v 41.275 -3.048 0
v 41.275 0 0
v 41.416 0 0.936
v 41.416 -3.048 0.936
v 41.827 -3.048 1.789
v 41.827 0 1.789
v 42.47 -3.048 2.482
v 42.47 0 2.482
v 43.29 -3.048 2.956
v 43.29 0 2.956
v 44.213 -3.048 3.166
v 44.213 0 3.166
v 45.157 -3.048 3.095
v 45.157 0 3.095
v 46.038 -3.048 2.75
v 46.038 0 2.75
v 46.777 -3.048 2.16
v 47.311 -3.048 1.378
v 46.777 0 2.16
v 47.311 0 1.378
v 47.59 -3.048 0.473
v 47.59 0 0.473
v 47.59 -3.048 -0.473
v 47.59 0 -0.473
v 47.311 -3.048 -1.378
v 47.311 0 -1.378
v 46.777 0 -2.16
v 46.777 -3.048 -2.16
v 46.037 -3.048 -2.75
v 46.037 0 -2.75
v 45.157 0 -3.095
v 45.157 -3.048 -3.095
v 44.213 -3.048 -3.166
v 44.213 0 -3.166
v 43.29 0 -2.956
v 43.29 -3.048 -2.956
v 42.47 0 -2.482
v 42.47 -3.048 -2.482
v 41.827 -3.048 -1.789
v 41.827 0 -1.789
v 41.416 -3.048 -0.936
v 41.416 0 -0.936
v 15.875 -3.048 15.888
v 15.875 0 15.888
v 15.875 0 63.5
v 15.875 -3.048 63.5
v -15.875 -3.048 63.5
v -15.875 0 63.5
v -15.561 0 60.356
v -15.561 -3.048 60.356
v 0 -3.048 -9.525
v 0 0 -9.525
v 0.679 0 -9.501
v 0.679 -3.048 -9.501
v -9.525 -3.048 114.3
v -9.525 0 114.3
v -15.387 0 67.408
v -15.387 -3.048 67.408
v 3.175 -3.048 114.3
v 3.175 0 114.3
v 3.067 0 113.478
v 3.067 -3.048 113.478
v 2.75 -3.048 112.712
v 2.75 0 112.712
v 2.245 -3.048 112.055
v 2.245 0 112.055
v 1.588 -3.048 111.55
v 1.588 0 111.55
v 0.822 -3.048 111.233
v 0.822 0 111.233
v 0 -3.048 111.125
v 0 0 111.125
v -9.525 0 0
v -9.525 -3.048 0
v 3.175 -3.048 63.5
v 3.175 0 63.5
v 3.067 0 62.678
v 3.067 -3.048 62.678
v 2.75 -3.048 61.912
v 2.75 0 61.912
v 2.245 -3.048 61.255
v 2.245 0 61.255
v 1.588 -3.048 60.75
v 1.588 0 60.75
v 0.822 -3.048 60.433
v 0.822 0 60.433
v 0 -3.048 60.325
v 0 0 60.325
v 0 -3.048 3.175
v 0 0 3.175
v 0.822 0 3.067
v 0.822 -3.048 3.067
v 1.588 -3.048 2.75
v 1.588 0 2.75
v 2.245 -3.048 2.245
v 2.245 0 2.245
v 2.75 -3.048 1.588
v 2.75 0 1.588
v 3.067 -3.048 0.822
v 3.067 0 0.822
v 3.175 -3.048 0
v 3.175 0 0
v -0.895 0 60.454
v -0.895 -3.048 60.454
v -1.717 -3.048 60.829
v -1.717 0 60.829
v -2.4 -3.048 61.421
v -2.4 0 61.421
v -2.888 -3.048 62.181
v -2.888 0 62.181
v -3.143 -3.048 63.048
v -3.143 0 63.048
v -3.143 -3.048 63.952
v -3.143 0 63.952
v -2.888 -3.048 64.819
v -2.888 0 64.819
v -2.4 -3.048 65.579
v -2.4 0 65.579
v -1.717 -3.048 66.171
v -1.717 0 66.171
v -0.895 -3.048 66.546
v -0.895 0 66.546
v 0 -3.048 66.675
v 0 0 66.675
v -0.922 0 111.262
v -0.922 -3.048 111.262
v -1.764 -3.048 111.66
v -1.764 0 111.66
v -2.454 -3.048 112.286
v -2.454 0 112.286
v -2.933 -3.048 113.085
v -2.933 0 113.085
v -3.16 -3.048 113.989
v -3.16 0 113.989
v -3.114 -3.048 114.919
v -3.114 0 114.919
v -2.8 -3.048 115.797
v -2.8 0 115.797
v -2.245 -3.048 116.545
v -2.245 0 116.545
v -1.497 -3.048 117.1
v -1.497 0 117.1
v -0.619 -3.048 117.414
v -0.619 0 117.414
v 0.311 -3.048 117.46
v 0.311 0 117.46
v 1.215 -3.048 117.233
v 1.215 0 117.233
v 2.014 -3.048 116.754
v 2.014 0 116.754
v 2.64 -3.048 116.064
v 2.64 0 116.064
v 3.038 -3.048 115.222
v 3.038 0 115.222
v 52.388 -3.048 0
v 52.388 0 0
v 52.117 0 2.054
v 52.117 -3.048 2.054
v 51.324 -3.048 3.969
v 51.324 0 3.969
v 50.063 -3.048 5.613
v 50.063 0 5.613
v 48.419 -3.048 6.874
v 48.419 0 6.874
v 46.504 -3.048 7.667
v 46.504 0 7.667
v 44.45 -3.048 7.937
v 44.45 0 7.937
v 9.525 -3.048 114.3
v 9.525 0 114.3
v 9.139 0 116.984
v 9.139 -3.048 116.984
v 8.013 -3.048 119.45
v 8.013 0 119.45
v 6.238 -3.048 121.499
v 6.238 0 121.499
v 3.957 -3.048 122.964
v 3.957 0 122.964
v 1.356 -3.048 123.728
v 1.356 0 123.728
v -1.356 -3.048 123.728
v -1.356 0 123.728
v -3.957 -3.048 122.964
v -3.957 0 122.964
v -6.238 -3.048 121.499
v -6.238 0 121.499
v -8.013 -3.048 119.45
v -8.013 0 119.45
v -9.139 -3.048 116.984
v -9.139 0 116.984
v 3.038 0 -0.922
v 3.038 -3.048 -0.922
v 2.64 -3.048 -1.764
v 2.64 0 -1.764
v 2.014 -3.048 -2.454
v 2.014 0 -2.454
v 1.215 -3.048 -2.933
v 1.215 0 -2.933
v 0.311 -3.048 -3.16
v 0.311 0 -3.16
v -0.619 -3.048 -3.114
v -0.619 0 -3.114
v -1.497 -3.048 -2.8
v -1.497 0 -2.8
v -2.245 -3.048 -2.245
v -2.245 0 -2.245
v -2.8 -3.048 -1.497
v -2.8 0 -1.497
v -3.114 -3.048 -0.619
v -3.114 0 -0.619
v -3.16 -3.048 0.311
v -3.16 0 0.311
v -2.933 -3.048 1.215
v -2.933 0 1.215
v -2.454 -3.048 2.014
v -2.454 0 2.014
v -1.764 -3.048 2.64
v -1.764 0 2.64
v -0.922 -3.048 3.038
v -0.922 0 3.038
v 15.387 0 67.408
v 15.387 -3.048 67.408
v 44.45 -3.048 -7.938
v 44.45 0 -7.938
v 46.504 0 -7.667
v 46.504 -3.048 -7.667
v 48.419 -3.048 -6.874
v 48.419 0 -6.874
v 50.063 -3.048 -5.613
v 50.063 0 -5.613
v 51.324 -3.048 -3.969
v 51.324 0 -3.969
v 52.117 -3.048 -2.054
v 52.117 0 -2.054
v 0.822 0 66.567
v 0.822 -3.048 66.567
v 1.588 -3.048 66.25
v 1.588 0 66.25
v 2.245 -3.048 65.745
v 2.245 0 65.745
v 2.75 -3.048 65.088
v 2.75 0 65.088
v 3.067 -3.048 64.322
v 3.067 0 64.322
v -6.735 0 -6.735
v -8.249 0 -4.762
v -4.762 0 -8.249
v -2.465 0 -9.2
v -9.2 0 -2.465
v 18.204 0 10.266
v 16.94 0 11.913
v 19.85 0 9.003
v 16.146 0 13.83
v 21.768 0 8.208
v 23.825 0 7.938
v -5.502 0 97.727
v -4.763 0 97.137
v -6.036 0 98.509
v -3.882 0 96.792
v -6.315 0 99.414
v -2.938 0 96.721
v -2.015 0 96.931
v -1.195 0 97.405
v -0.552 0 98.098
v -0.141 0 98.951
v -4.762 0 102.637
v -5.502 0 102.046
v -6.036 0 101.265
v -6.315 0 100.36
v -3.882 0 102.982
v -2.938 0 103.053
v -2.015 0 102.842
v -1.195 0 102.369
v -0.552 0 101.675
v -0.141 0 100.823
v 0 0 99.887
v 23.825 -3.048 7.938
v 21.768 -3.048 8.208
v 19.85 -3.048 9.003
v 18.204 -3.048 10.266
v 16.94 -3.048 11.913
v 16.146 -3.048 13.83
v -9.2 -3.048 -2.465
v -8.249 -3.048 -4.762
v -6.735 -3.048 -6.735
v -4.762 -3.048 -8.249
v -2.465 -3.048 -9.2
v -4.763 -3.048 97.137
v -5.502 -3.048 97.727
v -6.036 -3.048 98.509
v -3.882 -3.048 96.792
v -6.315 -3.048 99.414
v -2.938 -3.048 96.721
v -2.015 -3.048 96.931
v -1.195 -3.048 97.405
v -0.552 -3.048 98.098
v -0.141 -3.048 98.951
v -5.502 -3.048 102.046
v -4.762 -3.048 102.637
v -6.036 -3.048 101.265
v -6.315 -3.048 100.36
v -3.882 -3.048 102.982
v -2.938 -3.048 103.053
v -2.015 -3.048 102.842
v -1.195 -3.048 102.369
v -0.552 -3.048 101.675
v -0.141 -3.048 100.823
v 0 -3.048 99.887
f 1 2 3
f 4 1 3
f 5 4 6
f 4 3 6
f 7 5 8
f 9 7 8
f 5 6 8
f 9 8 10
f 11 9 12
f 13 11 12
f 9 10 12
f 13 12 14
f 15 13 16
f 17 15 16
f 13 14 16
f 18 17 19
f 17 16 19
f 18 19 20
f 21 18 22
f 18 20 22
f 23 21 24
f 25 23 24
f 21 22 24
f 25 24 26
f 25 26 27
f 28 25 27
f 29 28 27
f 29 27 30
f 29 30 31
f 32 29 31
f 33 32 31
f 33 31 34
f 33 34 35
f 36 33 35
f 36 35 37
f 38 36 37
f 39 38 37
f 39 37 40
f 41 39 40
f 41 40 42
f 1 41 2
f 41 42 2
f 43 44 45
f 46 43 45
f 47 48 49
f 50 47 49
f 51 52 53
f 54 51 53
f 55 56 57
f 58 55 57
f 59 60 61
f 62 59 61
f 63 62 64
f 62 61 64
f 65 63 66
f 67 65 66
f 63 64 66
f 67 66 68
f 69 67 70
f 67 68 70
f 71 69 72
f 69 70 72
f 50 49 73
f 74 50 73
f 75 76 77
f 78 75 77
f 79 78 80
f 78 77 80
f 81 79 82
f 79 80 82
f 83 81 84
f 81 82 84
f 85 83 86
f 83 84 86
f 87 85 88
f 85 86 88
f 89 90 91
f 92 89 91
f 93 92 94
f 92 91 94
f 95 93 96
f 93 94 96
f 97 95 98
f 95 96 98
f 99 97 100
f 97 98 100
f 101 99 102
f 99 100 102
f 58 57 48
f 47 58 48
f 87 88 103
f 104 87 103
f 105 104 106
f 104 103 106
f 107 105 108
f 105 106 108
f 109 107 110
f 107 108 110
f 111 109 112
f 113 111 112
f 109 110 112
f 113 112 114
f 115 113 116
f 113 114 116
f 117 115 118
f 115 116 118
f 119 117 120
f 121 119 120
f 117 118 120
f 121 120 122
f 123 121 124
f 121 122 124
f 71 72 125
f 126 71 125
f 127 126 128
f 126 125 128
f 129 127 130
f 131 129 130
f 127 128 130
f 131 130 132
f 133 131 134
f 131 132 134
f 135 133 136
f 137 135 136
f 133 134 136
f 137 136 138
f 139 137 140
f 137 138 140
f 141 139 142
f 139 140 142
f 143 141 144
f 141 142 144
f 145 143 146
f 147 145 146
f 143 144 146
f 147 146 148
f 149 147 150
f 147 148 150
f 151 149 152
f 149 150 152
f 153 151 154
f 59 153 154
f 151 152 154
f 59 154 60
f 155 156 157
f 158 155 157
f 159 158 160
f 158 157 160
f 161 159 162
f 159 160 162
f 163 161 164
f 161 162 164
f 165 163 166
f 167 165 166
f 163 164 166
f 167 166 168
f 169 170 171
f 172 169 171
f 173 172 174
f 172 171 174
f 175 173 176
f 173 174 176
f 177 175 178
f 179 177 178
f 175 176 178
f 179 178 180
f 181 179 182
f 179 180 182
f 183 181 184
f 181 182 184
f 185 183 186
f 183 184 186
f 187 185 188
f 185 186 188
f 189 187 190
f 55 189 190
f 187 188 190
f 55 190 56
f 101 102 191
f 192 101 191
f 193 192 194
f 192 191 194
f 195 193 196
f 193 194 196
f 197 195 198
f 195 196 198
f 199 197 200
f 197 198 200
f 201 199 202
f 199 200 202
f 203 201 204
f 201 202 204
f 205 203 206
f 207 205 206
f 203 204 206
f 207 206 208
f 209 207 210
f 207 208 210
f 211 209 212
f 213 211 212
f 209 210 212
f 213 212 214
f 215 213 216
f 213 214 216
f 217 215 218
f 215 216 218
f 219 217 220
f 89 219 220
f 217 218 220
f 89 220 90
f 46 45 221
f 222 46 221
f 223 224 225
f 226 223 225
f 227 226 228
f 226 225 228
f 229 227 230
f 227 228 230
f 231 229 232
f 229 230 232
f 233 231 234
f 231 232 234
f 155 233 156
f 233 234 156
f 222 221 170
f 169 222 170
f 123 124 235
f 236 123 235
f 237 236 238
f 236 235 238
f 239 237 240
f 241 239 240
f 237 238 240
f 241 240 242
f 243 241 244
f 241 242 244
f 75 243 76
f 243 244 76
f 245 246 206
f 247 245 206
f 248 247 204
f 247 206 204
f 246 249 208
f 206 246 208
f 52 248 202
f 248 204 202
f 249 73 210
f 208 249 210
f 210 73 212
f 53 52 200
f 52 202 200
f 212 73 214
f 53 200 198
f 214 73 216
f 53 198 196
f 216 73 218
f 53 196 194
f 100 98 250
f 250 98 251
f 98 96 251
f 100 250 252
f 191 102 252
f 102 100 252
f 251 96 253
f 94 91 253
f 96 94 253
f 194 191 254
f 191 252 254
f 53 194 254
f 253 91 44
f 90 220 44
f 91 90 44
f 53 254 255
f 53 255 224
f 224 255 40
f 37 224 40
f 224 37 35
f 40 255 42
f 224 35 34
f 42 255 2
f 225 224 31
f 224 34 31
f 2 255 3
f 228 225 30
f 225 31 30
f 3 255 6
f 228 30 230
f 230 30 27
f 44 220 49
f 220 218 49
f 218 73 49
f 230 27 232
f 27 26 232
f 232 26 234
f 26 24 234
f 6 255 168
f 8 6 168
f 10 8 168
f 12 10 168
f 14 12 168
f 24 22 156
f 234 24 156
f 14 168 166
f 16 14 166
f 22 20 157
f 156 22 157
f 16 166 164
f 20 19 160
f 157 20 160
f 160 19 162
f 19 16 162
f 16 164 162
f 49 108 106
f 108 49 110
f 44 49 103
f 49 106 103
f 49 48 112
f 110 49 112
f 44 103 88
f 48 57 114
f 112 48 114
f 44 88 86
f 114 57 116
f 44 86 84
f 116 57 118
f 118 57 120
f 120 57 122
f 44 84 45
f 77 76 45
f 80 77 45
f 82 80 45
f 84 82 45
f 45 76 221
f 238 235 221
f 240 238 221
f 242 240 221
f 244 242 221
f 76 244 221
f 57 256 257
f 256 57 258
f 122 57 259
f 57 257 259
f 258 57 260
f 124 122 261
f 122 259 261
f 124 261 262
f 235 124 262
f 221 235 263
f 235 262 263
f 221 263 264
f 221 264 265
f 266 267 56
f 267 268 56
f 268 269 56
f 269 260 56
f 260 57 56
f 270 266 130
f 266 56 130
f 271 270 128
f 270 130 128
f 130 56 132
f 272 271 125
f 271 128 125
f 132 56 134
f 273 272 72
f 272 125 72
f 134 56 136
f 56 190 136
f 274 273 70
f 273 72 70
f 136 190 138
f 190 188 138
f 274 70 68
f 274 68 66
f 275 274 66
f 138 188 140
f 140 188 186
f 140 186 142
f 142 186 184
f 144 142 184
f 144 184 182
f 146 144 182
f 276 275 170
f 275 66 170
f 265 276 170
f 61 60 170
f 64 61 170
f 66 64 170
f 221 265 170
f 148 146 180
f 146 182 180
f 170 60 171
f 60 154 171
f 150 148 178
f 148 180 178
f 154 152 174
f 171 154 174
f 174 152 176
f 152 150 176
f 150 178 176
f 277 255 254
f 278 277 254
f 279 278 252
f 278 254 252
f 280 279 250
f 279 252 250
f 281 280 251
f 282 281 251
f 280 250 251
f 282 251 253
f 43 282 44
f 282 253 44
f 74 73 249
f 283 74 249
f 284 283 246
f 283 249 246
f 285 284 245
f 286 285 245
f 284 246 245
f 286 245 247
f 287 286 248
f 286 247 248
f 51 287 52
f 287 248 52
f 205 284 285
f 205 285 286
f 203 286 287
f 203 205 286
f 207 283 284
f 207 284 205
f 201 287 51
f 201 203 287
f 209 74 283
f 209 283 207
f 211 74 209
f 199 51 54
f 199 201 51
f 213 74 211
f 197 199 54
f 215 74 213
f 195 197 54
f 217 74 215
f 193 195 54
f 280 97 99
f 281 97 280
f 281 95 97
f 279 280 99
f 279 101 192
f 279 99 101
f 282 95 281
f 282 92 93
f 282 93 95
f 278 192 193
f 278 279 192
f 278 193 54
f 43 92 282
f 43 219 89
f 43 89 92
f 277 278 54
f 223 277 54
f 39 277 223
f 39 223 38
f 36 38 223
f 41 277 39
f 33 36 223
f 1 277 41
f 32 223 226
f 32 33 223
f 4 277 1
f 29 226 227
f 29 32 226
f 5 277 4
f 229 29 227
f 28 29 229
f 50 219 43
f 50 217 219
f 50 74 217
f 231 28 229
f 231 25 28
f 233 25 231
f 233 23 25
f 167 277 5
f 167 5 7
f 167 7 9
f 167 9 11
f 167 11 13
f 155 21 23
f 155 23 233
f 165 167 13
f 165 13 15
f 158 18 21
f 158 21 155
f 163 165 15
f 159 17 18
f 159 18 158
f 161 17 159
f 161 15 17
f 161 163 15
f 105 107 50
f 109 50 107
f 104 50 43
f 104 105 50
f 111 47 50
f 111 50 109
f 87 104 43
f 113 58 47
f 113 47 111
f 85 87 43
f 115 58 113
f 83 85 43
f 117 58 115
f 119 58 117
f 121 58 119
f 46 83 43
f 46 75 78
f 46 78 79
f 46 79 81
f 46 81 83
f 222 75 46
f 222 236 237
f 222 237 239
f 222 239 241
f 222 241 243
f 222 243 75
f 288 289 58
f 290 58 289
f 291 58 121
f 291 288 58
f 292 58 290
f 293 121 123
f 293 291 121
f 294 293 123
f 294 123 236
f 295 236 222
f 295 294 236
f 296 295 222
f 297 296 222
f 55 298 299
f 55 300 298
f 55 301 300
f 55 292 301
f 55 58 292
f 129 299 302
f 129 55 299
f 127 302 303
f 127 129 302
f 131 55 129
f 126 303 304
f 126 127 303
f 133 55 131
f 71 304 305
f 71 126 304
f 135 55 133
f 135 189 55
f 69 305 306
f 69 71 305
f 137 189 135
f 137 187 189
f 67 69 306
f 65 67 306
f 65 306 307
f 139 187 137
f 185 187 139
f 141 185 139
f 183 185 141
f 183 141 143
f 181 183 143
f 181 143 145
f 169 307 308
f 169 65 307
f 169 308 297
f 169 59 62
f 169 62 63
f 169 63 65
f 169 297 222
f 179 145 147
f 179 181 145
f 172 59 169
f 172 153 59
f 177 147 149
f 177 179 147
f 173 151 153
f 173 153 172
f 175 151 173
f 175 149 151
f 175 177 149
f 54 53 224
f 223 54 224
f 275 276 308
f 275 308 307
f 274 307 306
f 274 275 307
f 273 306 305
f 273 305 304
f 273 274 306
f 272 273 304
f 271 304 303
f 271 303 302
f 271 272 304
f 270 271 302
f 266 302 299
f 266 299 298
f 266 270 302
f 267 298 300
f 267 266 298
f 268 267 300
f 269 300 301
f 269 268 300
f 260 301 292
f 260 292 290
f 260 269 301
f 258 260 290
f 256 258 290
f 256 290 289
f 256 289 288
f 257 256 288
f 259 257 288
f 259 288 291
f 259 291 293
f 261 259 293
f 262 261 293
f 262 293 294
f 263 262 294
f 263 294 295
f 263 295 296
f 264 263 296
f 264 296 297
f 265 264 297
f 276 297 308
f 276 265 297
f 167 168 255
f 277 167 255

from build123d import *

# Parameters (mm, degrees)
F0_R     = 3.175
F1_DEPTH = 3.048


with BuildPart() as f1:
    # F0 (on Front) → F1 (new body)
    with BuildSketch(Plane.XZ):
        with BuildLine():
            ThreePointArc((-15.3865384615, 67.4076923077), (-9.7463072395, 76.0309664508), (0, 79.375))
            Line((0, 79.375), (0, 99.886942851))
            Line((0, 99.886942851), (0, 104.775))
            ThreePointArc((0, 104.775), (-6.7351920908, 107.5648079092), (-9.525, 114.3))
            Line((-9.525, 114.3), (-15.3865384615, 67.4076923077))
        make_face()
        with Locations((-3.175, 99.886942851)):
            Circle(F0_R, mode=Mode.SUBTRACT)
        with BuildLine():
            ThreePointArc((0, 79.375), (9.7463072395, 76.0309664508), (15.3865384615, 67.4076923077))
            Line((15.3865384615, 67.4076923077), (9.525, 114.3))
            ThreePointArc((9.525, 114.3), (6.7351920908, 107.5648079092), (0, 104.775))
            Line((0, 104.775), (0, 99.886942851))
            Line((0, 99.886942851), (0, 79.375))
        make_face()
        with BuildLine():
            ThreePointArc((0, 104.775), (6.7351920908, 107.5648079092), (9.525, 114.3))
            ThreePointArc((9.525, 114.3), (0, 123.825), (-9.525, 114.3))
            ThreePointArc((-9.525, 114.3), (-6.7351920908, 107.5648079092), (0, 104.775))
        make_face()
        with BuildLine():
            ThreePointArc((3.175, 114.3), (2.2450640303, 112.0549359697), (0, 111.125))
            ThreePointArc((0, 111.125), (-2.2450640303, 116.5450640303), (3.175, 114.3))
        make_face(mode=Mode.SUBTRACT)
        with BuildLine():
            Line((0, 60.325), (0, 47.625))
            ThreePointArc((0, 47.625), (11.2253201513, 52.2746798487), (15.875, 63.5))
            Line((15.875, 63.5), (15.3865384615, 67.4076923077))
            ThreePointArc((15.3865384615, 67.4076923077), (9.7463072395, 76.0309664508), (0, 79.375))
            Line((0, 79.375), (0, 66.675))
            ThreePointArc((0, 66.675), (2.2450640303, 65.7450640303), (3.175, 63.5))
            ThreePointArc((3.175, 63.5), (2.2450640303, 61.2549359697), (0, 60.325))
        make_face()
        with BuildLine():
            ThreePointArc((-15.5606435644, 60.3564356436), (-10.0526499203, 51.2134278751), (0, 47.625))
            Line((0, 47.625), (0, 60.325))
            ThreePointArc((0, 60.325), (-3.175, 63.5), (0, 66.675))
            Line((0, 66.675), (0, 79.375))
            ThreePointArc((0, 79.375), (-9.7463072395, 76.0309664508), (-15.3865384615, 67.4076923077))
            Line((-15.3865384615, 67.4076923077), (-15.875, 63.5))
            Line((-15.875, 63.5), (-15.5606435644, 60.3564356436))
        make_face()
        with BuildLine():
            ThreePointArc((-9.525, 0), (-6.7351920908, 6.7351920908), (0, 9.525))
            Line((0, 9.525), (0, 47.625))
            ThreePointArc((0, 47.625), (-10.0526499203, 51.2134278751), (-15.5606435644, 60.3564356436))
            Line((-15.5606435644, 60.3564356436), (-9.525, 0))
        make_face()
        with BuildLine():
            Line((36.5125, 0), (9.525, 0))
            ThreePointArc((9.525, 0), (6.9712901065, -6.4905114784), (0.6794904459, -9.5007324841))
            Line((0.6794904459, -9.5007324841), (44.45, -7.9375))
            ThreePointArc((44.45, -7.9375), (38.8373399243, -5.6126600757), (36.5125, 0))
        make_face()
        with BuildLine():
            ThreePointArc((3.175, 0), (-2.2450640303, -2.2450640303), (0, 3.175))
            Line((0, 3.175), (0, 9.525))
            ThreePointArc((0, 9.525), (-6.7351920908, 6.7351920908), (-9.525, 0))
            ThreePointArc((-9.525, 0), (-6.7351920908, -6.7351920908), (0, -9.525))
            Line((0, -9.525), (0.6794904459, -9.5007324841))
            ThreePointArc((0.6794904459, -9.5007324841), (6.9712901065, -6.4905114784), (9.525, 0))
            Line((9.525, 0), (3.175, 0))
        make_face()
        with BuildLine():
            Line((0, 47.625), (0, 9.525))
            ThreePointArc((0, 9.525), (6.7351920908, 6.7351920908), (9.525, 0))
            Line((9.525, 0), (36.5125, 0))
            ThreePointArc((36.5125, 0), (38.8373399243, 5.6126600757), (44.45, 7.9375))
            Line((44.45, 7.9375), (23.8252, 7.9375))
            ThreePointArc((23.8252, 7.9375), (18.2035596682, 10.2660596682), (15.875, 15.8877))
            Line((15.875, 15.8877), (15.875, 63.5))
            ThreePointArc((15.875, 63.5), (11.2253201513, 52.2746798487), (0, 47.625))
        make_face()
        with BuildLine():
            Line((0, 9.525), (0, 3.175))
            ThreePointArc((0, 3.175), (2.2450640303, 2.2450640303), (3.175, 0))
            Line((3.175, 0), (9.525, 0))
            ThreePointArc((9.525, 0), (6.7351920908, 6.7351920908), (0, 9.525))
        make_face()
        with BuildLine():
            ThreePointArc((44.45, 7.9375), (38.8373399243, 5.6126600757), (36.5125, 0))
            ThreePointArc((36.5125, 0), (38.8373399243, -5.6126600757), (44.45, -7.9375))
            ThreePointArc((44.45, -7.9375), (50.0626600757, -5.6126600757), (52.3875, 0))
            ThreePointArc((52.3875, 0), (50.0626600757, 5.6126600757), (44.45, 7.9375))
        make_face()
        with BuildLine():
            ThreePointArc((47.625, 0), (44.45, -3.175), (41.275, 0))
            ThreePointArc((41.275, 0), (44.45, 3.175), (47.625, 0))
        make_face(mode=Mode.SUBTRACT)
    extrude(amount=F1_DEPTH)


solid = f1.part
